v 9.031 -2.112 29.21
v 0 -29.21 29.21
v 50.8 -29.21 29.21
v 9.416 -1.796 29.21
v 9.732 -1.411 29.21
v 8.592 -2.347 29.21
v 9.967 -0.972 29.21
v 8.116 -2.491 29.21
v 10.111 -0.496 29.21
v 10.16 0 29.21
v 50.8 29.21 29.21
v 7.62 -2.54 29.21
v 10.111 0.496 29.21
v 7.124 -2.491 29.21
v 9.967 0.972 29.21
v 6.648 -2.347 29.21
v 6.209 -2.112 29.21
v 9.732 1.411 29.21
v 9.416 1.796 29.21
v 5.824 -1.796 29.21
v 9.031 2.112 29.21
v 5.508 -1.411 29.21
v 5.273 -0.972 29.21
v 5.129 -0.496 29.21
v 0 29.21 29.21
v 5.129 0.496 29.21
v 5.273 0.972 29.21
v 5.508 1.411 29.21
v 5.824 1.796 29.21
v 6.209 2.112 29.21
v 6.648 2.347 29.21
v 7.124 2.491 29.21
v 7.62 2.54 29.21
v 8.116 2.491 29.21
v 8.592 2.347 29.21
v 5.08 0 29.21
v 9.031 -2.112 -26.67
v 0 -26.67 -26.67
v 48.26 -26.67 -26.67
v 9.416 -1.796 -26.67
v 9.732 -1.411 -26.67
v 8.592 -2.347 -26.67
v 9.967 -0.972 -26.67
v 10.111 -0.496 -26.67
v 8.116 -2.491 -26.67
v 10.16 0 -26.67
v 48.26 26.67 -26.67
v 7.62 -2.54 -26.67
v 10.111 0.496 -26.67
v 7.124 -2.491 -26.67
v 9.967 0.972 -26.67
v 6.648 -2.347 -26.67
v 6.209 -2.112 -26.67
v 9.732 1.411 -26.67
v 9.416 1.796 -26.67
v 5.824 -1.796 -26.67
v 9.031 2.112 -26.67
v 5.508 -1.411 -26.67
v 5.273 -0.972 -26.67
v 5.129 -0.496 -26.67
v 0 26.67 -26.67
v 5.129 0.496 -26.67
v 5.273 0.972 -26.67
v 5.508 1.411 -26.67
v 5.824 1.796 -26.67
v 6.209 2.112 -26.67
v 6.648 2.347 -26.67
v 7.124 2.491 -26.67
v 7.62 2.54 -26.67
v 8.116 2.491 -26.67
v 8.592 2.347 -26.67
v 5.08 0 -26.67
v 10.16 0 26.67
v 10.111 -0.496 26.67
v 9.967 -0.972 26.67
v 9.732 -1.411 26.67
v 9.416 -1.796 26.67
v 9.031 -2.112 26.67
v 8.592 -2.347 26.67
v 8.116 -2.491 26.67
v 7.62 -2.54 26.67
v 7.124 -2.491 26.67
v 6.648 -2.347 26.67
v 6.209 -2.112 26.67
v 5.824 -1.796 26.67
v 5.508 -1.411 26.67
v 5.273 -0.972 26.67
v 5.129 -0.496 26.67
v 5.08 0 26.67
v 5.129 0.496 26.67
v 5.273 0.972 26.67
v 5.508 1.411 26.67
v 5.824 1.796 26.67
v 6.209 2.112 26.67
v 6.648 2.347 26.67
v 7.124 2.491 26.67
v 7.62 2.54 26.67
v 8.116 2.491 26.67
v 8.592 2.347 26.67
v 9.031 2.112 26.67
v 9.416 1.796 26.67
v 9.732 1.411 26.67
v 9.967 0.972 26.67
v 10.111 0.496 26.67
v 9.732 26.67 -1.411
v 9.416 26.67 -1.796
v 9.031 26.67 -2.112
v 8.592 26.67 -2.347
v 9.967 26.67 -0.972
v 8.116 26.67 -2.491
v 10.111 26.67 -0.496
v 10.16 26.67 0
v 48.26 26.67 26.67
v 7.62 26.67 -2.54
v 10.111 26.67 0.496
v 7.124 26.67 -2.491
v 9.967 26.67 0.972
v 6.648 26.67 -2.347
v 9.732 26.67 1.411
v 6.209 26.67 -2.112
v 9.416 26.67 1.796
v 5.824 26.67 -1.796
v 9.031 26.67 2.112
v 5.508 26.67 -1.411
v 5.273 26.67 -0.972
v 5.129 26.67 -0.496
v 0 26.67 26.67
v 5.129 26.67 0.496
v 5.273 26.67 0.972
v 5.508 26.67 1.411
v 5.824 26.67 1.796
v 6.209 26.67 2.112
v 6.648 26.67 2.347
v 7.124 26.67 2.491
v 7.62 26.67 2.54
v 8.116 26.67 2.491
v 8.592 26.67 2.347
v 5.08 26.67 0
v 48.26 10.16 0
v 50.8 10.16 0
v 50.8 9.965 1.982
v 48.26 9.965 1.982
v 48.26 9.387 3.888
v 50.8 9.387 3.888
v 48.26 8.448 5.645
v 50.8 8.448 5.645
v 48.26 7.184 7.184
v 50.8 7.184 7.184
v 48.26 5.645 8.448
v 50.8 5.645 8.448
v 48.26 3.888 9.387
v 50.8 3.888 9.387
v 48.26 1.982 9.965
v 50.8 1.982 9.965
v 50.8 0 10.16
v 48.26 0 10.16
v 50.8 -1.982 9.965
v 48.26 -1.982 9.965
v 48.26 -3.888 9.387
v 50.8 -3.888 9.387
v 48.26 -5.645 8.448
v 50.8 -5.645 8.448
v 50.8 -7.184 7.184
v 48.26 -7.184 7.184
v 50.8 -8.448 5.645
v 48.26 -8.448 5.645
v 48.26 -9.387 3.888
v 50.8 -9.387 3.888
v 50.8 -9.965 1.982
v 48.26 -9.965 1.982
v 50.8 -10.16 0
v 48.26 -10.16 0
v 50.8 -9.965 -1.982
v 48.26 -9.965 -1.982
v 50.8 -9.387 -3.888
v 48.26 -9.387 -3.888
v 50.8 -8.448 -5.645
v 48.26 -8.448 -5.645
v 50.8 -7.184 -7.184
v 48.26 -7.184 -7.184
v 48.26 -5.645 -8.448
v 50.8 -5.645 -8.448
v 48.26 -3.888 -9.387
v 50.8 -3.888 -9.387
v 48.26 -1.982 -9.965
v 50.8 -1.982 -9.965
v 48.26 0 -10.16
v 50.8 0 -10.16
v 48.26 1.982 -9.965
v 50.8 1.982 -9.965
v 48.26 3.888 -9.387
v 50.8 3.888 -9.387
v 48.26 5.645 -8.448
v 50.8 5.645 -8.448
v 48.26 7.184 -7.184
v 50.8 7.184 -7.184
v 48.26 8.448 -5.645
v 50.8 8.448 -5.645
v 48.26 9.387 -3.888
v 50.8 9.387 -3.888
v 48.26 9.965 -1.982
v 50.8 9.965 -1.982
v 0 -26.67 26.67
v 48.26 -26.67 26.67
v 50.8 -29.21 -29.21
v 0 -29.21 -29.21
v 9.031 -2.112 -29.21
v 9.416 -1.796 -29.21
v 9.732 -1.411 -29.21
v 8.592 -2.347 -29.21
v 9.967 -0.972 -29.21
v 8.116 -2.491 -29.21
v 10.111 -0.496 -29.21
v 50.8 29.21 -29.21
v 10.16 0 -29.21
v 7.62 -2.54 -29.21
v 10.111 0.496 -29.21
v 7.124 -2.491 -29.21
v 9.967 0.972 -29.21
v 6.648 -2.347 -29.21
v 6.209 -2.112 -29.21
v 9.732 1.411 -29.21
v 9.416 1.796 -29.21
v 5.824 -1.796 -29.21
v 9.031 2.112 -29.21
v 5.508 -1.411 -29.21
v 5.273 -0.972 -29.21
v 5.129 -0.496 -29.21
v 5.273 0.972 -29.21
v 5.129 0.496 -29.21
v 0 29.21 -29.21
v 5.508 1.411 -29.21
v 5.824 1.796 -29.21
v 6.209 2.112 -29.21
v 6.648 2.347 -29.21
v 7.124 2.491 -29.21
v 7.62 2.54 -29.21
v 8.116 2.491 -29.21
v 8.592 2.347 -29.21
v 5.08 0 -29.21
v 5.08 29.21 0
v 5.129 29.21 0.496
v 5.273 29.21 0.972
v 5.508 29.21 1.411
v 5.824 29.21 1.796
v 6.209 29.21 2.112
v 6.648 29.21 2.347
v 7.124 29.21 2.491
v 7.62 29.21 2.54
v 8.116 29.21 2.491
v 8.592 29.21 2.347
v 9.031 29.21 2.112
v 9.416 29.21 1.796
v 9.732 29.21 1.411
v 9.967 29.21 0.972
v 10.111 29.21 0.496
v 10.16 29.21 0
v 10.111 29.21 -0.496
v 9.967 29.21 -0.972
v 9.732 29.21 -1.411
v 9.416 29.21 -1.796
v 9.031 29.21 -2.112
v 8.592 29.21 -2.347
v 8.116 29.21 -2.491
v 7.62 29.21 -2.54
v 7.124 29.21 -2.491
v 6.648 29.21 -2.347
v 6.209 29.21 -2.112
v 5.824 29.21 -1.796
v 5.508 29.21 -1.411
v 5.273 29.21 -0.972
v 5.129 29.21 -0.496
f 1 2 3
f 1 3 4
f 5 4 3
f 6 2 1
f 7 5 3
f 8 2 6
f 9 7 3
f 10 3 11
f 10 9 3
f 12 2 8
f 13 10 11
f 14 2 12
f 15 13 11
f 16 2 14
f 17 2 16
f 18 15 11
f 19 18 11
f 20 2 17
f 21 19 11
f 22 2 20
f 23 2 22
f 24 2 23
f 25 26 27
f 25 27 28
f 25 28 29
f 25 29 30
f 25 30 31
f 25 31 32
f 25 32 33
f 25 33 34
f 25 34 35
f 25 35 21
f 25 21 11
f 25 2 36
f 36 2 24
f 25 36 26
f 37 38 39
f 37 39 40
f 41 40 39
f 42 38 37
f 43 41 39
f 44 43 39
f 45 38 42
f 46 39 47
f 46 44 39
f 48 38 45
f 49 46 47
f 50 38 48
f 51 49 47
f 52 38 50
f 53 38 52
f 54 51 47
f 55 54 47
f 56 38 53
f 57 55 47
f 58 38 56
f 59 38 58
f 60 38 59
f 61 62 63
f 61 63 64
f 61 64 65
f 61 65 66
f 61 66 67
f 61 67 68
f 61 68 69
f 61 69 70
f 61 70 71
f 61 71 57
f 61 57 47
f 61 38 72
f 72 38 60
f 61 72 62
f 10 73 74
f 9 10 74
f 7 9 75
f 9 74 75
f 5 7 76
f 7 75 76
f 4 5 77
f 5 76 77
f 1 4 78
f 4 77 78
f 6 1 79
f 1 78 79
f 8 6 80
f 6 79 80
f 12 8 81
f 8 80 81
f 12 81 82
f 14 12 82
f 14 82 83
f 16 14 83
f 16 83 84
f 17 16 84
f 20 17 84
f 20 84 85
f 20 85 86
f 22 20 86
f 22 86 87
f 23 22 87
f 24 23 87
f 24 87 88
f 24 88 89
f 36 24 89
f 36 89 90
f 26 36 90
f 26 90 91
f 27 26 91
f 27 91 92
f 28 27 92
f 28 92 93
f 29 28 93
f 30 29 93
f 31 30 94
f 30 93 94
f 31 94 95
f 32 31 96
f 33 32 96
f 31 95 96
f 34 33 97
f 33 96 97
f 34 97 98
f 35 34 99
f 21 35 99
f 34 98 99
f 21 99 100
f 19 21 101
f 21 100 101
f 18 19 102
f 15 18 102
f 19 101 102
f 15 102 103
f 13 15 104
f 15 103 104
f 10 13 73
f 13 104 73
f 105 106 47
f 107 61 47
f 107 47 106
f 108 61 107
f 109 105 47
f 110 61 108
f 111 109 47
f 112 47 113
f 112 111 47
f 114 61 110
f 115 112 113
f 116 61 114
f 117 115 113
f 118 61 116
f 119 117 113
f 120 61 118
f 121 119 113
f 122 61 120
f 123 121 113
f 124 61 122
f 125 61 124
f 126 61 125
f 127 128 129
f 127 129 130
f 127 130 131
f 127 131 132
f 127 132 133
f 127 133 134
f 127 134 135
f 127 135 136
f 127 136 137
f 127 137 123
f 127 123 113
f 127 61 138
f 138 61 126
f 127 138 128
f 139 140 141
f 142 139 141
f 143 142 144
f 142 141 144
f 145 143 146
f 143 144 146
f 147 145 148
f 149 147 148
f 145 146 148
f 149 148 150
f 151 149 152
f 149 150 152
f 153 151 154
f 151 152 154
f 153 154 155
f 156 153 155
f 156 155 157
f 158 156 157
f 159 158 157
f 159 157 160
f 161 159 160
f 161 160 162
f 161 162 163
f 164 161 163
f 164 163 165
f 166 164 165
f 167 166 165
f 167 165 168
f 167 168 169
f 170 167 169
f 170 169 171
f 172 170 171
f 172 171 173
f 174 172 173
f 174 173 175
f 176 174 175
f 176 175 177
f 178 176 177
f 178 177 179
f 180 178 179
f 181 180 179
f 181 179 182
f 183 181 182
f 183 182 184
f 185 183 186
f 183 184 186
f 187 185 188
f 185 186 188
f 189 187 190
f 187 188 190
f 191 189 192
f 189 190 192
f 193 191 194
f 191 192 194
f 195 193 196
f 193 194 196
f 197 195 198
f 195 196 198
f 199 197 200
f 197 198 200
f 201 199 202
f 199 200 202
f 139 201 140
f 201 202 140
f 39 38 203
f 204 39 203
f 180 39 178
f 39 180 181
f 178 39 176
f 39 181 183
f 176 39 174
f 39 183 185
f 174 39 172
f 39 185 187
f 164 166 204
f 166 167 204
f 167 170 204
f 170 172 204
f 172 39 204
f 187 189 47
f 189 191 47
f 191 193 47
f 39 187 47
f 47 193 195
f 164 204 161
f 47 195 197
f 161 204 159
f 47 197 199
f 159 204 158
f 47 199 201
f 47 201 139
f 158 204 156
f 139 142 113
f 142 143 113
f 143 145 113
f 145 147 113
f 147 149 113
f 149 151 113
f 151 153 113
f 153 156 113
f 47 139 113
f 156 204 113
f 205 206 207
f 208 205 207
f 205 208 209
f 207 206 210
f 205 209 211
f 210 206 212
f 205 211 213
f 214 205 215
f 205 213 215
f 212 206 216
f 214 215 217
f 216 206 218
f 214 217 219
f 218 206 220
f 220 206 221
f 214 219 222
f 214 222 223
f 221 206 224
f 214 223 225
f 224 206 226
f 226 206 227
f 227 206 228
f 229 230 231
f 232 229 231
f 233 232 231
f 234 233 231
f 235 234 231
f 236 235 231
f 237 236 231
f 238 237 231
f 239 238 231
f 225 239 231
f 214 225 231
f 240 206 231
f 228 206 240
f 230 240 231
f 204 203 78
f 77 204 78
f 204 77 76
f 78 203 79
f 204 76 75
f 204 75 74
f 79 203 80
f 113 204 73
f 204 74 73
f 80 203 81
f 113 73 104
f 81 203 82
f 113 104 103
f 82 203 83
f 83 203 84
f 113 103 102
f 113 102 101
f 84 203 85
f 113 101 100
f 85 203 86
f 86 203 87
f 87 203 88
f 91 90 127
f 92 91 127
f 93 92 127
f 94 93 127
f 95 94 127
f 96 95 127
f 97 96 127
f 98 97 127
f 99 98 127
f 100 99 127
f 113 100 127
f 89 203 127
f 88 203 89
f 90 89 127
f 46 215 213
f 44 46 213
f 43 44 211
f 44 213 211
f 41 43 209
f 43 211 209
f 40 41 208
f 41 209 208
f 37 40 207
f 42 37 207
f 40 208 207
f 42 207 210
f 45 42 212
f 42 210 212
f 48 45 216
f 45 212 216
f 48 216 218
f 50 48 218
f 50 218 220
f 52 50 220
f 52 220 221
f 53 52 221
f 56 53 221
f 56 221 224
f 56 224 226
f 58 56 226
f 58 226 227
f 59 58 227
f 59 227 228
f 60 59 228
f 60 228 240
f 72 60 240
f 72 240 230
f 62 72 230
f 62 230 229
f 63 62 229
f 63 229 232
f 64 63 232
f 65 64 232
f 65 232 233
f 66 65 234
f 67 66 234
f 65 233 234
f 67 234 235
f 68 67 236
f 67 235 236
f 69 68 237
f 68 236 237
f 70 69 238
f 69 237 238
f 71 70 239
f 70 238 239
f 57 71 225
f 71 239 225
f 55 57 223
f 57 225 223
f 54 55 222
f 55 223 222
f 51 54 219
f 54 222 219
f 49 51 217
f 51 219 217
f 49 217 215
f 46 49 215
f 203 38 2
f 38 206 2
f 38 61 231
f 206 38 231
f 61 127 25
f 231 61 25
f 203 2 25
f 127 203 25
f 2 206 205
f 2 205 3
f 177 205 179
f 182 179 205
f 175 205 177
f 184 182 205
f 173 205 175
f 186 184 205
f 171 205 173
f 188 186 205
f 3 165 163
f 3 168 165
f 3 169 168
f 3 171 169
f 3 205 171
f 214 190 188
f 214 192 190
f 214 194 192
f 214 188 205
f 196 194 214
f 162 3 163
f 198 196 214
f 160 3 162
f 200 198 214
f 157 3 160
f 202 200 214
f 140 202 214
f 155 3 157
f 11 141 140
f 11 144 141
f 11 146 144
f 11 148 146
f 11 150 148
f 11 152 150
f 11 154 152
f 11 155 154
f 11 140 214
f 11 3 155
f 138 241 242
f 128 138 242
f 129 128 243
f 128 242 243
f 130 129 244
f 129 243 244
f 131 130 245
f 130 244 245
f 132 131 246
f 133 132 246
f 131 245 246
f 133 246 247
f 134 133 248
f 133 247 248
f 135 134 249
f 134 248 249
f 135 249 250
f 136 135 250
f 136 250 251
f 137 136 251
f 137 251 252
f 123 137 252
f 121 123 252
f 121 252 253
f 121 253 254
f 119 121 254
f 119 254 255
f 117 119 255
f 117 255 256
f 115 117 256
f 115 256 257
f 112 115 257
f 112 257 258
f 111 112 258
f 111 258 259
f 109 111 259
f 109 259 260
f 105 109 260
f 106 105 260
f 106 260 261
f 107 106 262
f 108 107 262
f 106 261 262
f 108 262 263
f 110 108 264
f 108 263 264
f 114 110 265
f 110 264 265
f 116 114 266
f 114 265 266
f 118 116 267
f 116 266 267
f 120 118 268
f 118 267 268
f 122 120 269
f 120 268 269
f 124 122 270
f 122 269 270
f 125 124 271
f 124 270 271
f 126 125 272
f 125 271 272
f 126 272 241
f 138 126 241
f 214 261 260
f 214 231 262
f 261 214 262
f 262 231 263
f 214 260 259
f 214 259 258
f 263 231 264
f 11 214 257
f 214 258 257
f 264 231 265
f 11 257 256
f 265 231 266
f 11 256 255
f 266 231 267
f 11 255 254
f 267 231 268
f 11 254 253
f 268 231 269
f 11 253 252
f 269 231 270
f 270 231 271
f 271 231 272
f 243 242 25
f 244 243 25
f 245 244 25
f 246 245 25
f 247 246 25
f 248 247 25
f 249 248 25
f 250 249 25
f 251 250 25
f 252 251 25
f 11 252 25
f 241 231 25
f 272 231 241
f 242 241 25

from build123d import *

# Parameters (mm, degrees)
F0_W     = 58.42
F0_H     = 58.42
F1_DEPTH = 50.8
F2_T     = -2.54
F3_R     = 10.16
F4_DEPTH = 25.4
F5_R     = 2.54
F6_DEPTH = 39.116
F7_R     = 2.54
F8_DEPTH = 80.01


with BuildPart() as f1:
    # F0 (on Right) → F1 (new body)
    with BuildSketch(Plane.YZ):
        Rectangle(F0_W, F0_H)
    extrude(amount=F1_DEPTH)

    # F2
    f2_openings = [f1.faces().sort_by_distance(p)[0] for p in [
        (0, 0, 0),
    ]]
    offset(amount=F2_T, openings=f2_openings)

    # F3 (on face) → F4 (cut)
    with BuildSketch(Plane.YZ.offset(50.8)):
        Circle(F3_R)
    extrude(amount=-F4_DEPTH, mode=Mode.SUBTRACT)

    # F5 (on face) → F6 (cut)
    with BuildSketch(Plane(origin=(0, 29.21, 0), x_dir=(-1, 0, 0), z_dir=(0, 1, 0))):
        with Locations((-7.62, 0)):
            Circle(F5_R)
    extrude(amount=-F6_DEPTH, mode=Mode.SUBTRACT)

    # F7 (on face) → F8 (cut)
    with BuildSketch(Plane(origin=(0, 0, -29.21), x_dir=(1, 0, 0), z_dir=(0, 0, -1))):
        with Locations((7.62, 0)):
            Circle(F7_R)
    extrude(amount=-F8_DEPTH, mode=Mode.SUBTRACT)


solid = f1.part
